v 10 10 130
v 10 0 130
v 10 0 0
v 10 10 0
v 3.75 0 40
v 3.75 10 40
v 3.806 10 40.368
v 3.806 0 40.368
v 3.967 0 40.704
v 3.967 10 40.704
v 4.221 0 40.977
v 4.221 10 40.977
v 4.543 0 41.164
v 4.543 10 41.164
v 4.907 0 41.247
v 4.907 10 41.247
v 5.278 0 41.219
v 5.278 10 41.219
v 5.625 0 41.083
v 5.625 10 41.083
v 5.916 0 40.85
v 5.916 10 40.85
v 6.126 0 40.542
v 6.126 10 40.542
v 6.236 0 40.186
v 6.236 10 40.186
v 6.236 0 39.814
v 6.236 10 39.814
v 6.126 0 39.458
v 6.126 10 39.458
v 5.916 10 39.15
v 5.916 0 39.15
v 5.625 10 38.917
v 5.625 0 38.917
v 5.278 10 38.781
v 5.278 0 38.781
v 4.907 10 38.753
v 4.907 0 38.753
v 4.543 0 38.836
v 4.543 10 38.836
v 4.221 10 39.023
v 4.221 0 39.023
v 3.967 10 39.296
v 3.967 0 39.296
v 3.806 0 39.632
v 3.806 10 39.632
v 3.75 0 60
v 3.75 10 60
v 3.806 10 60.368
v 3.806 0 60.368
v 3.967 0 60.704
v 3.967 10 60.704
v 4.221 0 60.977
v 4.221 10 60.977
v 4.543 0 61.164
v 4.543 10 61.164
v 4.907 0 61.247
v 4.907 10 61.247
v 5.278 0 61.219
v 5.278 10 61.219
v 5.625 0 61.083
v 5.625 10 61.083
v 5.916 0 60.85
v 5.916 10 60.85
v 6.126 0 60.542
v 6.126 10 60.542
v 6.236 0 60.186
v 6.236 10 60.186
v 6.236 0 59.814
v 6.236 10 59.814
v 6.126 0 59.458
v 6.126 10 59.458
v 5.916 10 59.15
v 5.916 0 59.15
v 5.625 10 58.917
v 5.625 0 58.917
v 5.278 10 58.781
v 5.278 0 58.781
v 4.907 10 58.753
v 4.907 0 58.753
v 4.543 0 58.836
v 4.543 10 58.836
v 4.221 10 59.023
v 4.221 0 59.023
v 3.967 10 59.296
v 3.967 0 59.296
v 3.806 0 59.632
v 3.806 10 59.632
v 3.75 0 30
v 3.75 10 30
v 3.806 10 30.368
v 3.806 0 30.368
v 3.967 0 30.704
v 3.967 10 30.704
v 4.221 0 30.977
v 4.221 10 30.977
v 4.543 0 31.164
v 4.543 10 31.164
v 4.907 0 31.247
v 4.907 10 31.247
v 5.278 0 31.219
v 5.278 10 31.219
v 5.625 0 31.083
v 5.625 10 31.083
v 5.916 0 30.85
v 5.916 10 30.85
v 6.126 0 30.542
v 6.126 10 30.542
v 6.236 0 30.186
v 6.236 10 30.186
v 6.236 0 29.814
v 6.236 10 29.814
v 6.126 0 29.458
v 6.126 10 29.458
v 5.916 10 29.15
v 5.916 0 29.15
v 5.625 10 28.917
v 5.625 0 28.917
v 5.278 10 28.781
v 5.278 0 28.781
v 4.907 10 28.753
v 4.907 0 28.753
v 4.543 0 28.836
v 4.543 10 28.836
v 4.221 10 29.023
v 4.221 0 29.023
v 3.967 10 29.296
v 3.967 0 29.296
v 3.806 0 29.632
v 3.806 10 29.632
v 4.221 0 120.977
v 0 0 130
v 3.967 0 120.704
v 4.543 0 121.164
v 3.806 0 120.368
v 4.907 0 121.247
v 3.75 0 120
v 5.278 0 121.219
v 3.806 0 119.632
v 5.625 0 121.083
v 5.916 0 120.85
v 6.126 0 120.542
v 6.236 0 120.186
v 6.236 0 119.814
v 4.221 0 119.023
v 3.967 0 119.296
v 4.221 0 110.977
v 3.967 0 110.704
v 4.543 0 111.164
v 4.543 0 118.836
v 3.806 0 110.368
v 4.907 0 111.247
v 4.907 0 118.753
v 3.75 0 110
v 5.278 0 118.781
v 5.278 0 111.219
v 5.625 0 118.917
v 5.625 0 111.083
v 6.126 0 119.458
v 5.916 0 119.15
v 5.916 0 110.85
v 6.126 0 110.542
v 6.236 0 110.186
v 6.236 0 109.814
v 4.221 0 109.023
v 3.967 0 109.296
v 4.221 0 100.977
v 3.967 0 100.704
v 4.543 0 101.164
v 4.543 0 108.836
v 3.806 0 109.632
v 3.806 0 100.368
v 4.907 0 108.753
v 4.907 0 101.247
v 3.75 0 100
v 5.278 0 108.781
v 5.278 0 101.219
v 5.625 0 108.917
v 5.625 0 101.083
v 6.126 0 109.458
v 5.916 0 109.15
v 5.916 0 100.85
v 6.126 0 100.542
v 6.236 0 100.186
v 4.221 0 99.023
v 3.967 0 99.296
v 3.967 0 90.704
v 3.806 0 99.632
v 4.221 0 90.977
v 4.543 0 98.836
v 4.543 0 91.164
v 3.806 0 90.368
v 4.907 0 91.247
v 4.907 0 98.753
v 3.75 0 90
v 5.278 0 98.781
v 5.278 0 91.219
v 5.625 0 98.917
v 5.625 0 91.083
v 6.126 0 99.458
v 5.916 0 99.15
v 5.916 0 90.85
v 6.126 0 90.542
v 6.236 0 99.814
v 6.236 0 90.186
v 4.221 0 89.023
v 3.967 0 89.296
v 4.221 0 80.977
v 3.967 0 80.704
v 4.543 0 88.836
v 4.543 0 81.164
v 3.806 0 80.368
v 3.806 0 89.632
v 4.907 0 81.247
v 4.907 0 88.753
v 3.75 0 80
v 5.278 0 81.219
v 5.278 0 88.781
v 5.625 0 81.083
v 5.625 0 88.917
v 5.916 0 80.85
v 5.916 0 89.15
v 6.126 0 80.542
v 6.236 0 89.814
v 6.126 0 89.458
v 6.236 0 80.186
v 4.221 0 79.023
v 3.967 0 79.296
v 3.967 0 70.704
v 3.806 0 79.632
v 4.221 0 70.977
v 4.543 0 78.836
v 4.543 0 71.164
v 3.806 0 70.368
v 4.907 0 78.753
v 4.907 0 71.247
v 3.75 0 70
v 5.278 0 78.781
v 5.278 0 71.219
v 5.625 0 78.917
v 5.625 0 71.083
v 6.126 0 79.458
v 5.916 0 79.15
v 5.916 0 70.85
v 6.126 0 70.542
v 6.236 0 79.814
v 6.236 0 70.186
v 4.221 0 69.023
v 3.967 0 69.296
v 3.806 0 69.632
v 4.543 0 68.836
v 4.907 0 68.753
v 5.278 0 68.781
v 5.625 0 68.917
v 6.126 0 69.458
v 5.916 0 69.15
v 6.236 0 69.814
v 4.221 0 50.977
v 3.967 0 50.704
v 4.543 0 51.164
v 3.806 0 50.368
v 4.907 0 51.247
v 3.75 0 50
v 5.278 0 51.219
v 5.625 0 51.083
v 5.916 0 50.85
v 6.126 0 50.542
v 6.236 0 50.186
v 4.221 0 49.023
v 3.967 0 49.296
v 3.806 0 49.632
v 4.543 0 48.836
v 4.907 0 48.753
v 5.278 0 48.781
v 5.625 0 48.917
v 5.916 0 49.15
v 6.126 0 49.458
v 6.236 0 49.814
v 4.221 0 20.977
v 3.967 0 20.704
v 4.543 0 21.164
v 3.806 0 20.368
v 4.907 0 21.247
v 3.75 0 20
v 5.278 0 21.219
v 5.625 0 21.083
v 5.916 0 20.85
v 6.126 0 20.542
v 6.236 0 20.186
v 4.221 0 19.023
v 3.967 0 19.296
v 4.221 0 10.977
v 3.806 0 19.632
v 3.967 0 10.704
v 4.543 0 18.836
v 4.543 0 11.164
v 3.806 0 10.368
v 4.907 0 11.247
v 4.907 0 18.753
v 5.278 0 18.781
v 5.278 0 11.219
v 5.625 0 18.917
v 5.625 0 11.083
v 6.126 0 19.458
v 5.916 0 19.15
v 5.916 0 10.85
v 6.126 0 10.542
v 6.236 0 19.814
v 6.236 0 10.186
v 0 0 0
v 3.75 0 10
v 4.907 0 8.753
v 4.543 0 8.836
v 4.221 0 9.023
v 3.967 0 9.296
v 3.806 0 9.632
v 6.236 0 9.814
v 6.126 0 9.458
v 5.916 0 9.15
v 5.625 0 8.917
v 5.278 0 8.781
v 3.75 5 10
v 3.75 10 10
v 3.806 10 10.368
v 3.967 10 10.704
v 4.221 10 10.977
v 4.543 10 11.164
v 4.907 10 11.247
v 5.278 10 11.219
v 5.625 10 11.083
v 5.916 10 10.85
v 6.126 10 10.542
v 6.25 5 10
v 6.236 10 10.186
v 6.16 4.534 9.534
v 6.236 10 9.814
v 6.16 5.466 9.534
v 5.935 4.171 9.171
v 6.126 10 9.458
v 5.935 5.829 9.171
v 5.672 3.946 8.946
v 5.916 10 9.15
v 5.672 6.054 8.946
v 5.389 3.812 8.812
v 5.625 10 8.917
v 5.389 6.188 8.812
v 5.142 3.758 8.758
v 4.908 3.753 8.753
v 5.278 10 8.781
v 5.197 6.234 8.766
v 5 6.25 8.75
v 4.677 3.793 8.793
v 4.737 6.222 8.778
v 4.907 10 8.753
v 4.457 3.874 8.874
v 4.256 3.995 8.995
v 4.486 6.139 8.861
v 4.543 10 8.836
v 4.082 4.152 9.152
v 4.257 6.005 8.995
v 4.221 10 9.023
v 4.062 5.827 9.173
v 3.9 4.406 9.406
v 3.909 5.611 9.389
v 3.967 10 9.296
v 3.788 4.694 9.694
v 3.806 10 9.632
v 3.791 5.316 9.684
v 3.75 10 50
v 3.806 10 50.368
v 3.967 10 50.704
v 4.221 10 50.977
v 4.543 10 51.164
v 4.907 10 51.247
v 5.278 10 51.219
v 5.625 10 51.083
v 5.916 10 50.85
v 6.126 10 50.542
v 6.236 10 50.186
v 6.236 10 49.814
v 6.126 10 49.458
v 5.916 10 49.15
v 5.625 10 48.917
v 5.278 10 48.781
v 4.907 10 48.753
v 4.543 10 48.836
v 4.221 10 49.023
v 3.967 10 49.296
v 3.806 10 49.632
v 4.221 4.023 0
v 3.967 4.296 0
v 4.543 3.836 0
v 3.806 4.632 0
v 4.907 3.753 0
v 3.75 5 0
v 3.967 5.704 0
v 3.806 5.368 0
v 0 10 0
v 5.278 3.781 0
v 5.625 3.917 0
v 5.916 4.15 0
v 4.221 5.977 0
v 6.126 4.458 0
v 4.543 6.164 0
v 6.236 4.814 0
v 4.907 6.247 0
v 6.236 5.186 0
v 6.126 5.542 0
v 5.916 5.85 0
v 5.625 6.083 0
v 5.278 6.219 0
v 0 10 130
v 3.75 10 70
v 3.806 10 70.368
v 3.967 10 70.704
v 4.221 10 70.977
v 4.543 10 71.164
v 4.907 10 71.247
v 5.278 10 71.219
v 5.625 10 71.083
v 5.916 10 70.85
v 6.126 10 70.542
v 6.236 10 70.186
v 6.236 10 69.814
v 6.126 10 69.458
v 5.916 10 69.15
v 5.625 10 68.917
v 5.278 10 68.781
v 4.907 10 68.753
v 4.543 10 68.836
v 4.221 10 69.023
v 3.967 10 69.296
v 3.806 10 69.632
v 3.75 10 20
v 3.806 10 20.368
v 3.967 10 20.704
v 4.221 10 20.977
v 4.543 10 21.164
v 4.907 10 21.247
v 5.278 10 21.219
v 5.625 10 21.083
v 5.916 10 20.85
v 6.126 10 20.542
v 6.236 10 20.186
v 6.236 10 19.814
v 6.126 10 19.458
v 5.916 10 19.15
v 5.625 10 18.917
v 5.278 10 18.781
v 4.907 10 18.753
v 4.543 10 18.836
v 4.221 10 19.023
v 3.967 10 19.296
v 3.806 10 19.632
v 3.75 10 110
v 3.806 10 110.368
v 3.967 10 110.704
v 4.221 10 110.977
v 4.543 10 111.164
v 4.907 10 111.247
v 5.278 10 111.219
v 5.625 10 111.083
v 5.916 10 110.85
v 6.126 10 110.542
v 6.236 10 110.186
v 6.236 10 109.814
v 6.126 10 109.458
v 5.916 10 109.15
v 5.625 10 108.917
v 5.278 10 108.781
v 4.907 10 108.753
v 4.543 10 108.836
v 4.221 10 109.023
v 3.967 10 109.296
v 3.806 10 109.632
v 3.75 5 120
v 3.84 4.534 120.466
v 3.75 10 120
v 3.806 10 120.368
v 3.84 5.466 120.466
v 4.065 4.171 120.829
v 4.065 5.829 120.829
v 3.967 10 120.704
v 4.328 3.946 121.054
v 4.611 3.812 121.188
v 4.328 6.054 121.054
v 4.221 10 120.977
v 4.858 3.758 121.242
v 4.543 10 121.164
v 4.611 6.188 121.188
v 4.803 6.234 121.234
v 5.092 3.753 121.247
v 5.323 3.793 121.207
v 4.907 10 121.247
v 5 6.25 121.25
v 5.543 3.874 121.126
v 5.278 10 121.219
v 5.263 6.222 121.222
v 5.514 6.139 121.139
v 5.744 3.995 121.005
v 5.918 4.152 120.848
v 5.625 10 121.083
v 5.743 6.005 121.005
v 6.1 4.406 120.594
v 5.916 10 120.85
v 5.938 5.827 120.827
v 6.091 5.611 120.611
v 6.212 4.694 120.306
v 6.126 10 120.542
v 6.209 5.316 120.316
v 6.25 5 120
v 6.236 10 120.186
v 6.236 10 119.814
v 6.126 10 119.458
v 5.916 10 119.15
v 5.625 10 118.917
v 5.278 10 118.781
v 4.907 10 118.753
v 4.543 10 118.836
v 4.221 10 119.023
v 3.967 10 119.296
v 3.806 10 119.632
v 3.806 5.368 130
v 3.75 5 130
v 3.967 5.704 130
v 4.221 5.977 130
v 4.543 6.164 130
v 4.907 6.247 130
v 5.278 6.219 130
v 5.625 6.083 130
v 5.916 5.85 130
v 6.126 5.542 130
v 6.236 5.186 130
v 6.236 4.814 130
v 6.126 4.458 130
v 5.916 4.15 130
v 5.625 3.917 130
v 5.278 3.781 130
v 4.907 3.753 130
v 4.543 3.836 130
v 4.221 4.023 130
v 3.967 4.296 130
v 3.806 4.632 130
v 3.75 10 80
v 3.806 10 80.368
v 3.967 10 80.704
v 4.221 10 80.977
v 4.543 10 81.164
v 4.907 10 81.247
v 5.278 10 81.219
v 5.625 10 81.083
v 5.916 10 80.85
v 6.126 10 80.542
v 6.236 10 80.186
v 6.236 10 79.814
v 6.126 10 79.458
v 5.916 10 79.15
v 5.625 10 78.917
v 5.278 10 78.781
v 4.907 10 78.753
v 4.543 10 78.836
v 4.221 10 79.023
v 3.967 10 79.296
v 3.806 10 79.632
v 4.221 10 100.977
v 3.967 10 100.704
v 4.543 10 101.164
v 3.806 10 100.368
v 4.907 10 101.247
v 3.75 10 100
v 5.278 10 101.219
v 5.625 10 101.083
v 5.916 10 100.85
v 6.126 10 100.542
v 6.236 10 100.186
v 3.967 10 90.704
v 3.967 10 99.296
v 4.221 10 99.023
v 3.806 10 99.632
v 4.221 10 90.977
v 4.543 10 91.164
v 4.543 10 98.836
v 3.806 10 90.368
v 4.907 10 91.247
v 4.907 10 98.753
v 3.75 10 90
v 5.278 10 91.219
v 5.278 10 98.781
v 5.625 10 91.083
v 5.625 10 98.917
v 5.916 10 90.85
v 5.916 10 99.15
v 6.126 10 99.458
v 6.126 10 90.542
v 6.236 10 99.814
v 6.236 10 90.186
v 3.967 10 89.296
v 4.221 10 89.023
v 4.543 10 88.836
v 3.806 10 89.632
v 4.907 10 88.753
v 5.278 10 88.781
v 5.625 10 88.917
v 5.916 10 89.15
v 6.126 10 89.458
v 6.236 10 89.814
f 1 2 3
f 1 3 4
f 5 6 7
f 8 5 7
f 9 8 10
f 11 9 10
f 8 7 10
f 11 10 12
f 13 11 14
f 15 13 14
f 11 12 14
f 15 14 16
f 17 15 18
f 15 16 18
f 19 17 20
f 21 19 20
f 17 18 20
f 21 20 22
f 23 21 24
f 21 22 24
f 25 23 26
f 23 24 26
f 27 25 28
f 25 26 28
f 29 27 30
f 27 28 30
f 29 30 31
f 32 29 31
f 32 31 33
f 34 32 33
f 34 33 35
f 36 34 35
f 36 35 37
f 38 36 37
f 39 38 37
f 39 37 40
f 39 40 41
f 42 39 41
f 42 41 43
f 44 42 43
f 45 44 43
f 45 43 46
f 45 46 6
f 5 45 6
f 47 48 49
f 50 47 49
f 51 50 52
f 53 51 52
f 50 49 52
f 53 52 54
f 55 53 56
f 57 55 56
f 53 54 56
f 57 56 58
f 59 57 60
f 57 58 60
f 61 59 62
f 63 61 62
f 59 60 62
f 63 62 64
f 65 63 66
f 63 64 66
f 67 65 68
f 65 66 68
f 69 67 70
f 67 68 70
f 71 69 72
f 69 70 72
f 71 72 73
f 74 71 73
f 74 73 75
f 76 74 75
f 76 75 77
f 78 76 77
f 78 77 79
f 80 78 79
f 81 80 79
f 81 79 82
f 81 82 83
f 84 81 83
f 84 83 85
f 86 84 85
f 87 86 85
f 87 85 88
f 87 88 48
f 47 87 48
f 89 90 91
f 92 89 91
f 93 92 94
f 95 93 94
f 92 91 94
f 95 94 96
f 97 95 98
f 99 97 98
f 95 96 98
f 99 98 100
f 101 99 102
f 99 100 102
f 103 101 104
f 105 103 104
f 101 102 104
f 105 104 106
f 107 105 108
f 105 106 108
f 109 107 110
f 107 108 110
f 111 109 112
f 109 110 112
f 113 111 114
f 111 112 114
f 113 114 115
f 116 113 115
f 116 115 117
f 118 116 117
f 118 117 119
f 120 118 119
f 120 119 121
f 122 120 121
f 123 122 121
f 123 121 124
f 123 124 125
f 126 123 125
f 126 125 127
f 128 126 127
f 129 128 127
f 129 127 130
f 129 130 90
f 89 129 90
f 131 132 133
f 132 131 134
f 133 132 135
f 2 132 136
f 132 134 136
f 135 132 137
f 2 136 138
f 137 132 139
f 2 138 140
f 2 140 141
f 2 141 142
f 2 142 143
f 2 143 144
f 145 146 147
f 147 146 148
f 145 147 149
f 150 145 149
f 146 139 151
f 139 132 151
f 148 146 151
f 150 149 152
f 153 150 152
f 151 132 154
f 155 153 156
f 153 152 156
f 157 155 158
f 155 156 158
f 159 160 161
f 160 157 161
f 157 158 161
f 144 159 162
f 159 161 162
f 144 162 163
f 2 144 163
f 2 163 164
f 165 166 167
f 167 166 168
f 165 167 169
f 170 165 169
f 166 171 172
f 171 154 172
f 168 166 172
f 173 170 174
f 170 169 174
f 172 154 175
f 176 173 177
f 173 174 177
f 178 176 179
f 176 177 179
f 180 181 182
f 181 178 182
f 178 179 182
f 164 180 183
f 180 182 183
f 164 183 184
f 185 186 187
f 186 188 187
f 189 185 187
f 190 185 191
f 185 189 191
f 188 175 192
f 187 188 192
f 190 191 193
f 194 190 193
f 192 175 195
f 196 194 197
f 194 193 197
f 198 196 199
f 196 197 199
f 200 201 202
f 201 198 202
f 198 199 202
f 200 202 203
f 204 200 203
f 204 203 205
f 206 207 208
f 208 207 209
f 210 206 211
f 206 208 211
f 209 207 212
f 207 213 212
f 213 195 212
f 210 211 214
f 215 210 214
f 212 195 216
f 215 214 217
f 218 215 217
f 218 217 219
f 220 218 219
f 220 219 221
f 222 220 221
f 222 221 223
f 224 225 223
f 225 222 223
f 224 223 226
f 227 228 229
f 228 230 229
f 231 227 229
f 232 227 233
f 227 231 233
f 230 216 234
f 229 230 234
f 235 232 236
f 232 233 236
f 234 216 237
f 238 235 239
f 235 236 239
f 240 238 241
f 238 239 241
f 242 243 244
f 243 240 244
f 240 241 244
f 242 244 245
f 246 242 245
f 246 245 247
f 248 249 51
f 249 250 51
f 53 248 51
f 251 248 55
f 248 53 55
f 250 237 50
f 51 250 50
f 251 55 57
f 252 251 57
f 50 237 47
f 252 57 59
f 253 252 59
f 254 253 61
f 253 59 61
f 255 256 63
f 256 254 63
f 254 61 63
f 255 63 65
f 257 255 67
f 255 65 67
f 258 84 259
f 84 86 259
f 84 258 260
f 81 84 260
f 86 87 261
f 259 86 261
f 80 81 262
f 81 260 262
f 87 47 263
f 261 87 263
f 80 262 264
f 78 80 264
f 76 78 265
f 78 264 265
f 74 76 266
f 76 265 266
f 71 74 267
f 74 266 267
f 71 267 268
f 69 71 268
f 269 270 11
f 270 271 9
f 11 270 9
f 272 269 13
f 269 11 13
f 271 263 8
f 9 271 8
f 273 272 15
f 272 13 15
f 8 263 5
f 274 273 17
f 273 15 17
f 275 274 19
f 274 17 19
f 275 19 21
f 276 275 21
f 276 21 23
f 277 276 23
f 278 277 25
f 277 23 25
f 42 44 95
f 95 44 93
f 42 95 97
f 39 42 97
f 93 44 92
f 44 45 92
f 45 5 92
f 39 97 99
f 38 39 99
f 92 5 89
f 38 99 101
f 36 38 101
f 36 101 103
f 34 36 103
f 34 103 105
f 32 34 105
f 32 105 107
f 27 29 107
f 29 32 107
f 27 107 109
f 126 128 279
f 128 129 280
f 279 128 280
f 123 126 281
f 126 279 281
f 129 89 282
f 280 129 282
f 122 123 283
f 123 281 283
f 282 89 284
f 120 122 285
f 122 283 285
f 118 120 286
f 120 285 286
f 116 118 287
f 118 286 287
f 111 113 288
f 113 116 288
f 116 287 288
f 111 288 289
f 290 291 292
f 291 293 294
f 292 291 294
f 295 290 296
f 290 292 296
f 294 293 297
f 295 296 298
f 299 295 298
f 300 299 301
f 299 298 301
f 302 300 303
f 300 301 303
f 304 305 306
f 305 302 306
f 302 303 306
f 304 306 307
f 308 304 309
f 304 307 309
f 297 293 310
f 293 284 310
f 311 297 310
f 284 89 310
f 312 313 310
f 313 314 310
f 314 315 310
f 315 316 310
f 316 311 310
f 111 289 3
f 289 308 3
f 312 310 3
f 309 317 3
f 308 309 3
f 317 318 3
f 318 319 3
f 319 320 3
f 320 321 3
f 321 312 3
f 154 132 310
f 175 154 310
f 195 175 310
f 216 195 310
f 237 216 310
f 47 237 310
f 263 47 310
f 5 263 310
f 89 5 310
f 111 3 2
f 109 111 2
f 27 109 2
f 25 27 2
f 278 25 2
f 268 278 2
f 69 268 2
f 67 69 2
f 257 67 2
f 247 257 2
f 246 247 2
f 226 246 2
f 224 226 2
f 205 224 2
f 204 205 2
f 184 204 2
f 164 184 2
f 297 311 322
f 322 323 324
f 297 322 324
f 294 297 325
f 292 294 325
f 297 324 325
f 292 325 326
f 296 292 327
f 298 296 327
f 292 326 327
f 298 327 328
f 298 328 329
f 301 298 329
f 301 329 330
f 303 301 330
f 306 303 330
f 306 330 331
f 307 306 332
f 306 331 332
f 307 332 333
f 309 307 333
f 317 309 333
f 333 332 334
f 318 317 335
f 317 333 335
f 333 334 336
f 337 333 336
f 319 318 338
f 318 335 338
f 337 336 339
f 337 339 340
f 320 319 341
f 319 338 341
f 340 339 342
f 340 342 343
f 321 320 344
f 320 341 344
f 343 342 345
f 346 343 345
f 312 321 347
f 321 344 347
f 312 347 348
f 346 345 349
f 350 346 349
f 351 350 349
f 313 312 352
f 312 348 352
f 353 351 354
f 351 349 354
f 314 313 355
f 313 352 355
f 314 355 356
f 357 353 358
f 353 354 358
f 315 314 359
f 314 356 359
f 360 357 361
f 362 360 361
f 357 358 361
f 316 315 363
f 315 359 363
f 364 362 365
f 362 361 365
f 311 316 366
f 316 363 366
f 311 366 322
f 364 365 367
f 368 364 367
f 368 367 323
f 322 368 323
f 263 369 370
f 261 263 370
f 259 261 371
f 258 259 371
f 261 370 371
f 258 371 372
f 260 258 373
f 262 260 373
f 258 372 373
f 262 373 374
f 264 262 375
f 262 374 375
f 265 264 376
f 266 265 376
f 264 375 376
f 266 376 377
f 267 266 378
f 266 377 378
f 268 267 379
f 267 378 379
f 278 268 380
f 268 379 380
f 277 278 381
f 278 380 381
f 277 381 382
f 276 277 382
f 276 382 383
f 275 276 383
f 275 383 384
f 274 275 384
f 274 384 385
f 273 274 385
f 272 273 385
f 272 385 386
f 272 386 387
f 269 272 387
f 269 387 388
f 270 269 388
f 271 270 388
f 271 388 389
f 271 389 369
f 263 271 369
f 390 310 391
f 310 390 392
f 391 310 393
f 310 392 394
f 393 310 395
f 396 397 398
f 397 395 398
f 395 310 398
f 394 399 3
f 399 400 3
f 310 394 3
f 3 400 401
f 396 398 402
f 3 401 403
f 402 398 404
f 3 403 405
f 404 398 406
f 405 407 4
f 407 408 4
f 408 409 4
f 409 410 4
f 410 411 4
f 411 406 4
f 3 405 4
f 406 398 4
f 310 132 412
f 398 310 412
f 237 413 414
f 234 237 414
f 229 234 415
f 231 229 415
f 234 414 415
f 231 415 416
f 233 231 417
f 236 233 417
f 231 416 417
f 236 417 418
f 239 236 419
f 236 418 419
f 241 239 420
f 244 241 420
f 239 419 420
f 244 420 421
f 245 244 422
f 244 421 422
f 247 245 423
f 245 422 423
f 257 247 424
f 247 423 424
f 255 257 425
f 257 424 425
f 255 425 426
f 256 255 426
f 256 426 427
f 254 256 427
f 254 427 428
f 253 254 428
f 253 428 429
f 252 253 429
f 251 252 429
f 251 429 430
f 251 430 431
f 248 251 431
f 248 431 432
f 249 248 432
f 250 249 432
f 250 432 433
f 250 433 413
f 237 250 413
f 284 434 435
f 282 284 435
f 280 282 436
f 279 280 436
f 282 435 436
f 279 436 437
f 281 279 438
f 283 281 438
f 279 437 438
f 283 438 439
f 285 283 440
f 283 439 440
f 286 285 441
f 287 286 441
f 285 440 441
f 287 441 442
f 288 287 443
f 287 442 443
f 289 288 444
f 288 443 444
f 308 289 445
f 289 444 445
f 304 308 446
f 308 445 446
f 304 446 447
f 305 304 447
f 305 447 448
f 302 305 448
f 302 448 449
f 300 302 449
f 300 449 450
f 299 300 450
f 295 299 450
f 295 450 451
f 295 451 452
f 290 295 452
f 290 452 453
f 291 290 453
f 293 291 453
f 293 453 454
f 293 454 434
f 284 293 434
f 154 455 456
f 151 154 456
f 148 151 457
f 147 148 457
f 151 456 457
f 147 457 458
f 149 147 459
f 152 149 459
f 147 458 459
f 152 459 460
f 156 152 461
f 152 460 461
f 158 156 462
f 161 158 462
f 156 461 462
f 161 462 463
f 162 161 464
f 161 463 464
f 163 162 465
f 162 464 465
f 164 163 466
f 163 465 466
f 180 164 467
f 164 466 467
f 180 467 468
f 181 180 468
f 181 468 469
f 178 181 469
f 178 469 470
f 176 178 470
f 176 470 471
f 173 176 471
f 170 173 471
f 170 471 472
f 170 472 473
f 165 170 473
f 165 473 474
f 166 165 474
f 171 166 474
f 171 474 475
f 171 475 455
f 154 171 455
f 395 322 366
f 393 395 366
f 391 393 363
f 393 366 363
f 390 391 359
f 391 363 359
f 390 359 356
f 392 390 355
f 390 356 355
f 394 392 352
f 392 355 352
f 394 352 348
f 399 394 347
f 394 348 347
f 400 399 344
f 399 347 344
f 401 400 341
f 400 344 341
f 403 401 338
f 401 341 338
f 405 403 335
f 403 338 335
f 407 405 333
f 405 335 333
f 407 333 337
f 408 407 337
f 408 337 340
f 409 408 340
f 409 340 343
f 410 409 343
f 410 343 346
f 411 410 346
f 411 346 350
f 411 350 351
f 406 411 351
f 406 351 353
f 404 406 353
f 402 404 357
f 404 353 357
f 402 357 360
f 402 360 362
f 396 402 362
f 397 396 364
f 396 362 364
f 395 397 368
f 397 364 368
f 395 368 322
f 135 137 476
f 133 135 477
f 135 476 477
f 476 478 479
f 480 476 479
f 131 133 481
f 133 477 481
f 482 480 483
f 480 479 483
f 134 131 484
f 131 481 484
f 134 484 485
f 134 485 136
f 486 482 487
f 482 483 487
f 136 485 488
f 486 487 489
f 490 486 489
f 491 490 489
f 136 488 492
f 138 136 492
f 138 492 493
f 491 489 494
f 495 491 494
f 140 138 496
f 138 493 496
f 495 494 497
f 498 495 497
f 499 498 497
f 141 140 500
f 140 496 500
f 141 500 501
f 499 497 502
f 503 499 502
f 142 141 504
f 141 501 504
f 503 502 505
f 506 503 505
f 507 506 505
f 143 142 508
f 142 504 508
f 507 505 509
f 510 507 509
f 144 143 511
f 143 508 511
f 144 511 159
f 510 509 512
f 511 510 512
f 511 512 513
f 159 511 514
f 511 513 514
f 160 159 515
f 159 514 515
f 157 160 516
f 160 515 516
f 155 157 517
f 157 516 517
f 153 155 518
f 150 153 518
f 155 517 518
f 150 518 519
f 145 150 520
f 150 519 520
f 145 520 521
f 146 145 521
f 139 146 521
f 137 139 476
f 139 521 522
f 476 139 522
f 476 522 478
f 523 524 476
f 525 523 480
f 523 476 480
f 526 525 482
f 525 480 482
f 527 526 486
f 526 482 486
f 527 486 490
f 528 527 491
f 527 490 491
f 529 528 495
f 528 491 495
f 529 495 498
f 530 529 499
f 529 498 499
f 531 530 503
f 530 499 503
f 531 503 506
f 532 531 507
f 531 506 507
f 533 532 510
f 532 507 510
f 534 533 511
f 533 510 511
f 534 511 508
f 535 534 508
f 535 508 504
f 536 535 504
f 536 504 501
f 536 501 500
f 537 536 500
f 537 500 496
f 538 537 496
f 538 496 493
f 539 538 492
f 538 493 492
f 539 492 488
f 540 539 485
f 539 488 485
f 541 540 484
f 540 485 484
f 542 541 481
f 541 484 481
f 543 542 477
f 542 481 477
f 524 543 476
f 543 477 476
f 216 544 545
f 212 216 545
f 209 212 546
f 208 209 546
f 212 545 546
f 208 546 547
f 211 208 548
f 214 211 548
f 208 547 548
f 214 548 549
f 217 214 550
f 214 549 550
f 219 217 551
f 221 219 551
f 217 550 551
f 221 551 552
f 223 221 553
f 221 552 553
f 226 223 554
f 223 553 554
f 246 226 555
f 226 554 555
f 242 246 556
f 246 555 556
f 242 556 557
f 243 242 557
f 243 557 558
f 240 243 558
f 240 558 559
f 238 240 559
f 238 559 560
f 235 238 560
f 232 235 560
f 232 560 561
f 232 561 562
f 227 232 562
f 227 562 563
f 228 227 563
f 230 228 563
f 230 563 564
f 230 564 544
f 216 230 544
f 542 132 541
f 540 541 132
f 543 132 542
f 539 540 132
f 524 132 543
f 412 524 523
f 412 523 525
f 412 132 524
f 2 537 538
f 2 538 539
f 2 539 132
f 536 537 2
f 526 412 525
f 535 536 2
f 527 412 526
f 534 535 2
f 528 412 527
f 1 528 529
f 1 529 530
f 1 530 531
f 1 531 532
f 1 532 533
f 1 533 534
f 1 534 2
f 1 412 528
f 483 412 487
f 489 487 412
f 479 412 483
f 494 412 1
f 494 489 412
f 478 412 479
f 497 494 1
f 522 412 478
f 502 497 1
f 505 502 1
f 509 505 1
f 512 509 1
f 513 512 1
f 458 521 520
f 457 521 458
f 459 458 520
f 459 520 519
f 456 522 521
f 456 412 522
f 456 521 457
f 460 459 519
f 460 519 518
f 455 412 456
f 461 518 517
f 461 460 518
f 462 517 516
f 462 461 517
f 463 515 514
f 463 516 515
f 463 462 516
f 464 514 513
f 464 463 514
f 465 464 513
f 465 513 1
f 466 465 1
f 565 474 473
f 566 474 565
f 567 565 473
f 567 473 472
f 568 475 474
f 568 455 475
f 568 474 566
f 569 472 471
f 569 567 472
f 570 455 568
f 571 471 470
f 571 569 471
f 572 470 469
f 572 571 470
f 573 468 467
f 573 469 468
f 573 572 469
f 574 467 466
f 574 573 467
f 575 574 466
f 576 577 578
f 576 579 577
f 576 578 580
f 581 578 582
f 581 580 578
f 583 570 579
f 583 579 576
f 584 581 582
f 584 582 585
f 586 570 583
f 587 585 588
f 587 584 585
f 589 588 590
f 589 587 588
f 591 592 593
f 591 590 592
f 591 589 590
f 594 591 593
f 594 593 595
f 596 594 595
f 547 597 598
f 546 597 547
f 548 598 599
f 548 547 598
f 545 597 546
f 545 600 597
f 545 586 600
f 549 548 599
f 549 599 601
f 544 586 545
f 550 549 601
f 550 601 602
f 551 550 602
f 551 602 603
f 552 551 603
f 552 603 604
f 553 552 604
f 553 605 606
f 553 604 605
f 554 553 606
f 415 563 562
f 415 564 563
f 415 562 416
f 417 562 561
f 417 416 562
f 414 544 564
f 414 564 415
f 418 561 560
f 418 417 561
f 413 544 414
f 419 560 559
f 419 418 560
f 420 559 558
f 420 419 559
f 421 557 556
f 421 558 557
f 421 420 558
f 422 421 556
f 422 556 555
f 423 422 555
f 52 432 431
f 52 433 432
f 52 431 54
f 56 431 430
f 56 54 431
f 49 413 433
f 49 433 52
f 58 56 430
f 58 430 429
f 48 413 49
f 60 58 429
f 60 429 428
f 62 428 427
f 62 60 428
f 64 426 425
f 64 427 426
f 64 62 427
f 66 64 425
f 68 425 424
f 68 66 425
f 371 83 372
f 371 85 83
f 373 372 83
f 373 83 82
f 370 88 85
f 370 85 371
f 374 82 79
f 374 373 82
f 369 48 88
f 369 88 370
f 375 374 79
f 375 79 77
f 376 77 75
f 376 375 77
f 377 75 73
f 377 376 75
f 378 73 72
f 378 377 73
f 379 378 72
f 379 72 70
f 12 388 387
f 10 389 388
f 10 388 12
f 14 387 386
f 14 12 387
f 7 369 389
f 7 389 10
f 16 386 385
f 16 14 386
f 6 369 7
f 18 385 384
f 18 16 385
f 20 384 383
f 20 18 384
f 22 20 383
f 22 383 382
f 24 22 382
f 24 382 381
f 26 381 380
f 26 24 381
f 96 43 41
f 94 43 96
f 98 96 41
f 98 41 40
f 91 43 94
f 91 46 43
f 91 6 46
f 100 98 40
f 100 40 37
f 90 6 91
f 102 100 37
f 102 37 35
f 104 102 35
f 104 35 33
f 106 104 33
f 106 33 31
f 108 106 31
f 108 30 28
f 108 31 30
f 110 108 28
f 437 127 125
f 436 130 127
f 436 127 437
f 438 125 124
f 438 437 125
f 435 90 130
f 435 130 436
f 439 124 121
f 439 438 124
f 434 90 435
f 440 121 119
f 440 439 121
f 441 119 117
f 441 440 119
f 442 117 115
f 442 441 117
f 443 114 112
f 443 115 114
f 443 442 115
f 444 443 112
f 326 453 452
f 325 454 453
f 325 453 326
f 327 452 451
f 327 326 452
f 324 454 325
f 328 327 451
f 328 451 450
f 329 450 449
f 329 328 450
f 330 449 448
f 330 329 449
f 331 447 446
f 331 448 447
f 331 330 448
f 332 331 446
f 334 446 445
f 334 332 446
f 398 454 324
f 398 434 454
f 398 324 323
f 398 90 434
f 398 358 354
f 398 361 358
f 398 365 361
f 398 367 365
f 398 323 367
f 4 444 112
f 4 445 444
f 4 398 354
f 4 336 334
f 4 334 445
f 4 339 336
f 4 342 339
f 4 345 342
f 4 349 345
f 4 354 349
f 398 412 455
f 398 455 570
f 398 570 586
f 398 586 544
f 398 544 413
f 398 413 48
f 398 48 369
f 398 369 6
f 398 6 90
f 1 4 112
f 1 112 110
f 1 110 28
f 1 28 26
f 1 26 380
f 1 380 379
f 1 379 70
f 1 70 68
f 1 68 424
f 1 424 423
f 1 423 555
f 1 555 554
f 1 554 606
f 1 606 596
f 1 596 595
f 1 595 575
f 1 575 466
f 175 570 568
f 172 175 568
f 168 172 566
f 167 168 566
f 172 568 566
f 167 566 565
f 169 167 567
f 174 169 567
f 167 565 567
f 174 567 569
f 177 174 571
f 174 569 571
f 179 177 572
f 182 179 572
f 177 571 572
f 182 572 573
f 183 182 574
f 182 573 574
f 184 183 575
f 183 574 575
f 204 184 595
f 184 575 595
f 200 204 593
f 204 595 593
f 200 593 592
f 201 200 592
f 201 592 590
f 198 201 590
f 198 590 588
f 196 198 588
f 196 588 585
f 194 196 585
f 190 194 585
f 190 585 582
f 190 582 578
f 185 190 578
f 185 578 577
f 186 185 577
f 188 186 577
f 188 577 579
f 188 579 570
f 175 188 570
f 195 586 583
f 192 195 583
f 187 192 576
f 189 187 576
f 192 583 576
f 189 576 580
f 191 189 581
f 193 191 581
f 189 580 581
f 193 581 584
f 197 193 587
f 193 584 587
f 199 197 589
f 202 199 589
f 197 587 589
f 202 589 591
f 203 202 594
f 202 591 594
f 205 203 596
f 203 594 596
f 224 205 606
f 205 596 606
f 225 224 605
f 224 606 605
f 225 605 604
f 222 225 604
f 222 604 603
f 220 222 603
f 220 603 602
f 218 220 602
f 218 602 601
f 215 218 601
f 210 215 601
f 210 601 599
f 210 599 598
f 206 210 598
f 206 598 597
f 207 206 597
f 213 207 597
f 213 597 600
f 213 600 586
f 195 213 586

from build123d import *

# Parameters (mm, degrees)
F0_W      = 10
F0_H      = 10
F1_DEPTH  = 130
F3_D      = 2.5
F3_DEPTH  = 10
F5_D      = 2.5
F5_DEPTH  = 10
F7_D      = 2.5
F7_DEPTH  = 10
F9_D      = 2.5
F9_DEPTH  = 10
F11_D     = 2.5
F11_DEPTH = 10
F13_D     = 2.5
F13_DEPTH = 10
F15_D     = 2.5
F15_DEPTH = 10


with BuildPart() as f1:
    # F0 (on Top) → F1 (new body)
    with BuildSketch(Plane.XY):
        with Locations((5, 5)):
            Rectangle(F0_W, F0_H)
    extrude(amount=F1_DEPTH)

    # F3
    with Locations(Plane.XZ):
        with Locations((5, 10), (5, 20), (5, 30)):
            Hole(F3_D / 2, depth=F3_DEPTH)

    # F5
    with Locations(Plane.XZ):
        with Locations((5, 40), (5, 50), (5, 60)):
            Hole(F5_D / 2, depth=F5_DEPTH)

    # F7
    with Locations(Plane.XZ):
        with Locations((5, 80), (5, 90), (5, 100), (5, 110)):
            Hole(F7_D / 2, depth=F7_DEPTH)

    # F9
    with Locations(Plane.XZ):
        with Locations((5, 70)):
            Hole(F9_D / 2, depth=F9_DEPTH)

    # F11
    with Locations(Plane.XZ):
        with Locations((5, 120)):
            Hole(F11_D / 2, depth=F11_DEPTH)

    # F13
    with Locations(Plane.XY.offset(130)):
        with Locations((5, 5)):
            Hole(F13_D / 2, depth=F13_DEPTH)

    # F15
    with Locations(Plane(origin=(0, 0, 0), x_dir=(1, 0, 0), z_dir=(0, 0, -1))):
        with Locations((5, -5)):
            Hole(F15_D / 2, depth=F15_DEPTH)


solid = f1.part
